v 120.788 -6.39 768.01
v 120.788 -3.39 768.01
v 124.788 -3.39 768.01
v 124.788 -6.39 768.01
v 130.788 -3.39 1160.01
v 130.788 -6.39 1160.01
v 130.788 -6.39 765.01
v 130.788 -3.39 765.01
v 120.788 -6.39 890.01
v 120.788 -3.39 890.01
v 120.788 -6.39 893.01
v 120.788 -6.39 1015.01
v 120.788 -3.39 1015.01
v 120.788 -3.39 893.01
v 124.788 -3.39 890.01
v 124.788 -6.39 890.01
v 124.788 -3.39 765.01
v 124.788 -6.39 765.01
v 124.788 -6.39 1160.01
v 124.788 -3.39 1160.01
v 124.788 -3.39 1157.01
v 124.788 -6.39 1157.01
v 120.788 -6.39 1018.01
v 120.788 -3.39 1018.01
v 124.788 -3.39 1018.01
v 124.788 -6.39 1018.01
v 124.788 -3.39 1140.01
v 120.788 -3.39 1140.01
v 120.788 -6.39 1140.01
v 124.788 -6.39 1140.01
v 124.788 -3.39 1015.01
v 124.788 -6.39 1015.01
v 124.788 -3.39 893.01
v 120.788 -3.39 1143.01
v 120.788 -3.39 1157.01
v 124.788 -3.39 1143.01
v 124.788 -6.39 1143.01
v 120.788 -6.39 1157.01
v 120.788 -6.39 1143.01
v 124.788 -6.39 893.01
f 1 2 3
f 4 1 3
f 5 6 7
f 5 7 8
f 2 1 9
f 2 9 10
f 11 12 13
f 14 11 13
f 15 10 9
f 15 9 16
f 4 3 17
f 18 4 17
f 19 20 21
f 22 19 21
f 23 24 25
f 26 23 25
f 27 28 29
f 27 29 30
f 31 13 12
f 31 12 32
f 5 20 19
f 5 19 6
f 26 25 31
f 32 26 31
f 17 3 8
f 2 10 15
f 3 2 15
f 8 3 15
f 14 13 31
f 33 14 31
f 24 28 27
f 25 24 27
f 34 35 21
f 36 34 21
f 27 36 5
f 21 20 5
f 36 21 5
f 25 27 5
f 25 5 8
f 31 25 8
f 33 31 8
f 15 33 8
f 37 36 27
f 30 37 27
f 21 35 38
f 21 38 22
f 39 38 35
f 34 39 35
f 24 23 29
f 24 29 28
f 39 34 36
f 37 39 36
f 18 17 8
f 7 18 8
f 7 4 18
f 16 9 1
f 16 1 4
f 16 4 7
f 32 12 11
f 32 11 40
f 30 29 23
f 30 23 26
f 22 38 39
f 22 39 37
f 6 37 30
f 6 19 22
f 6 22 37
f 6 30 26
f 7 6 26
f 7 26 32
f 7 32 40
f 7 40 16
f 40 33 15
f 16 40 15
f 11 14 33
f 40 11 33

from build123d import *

# Parameters (mm, degrees)
SKETCH_1_W          = 10
SKETCH_1_H          = 3
EXTRUDE_1_DEPTH     = 395
SKETCH_2_W          = 4
SKETCH_2_H          = 3
CUT_EXTRUDE_1_DEPTH = 1168.363523234


with BuildPart() as part:
    # 草图1 → 凸台-拉伸1 (new body)
    with BuildSketch(Plane.XY.offset(1160.01)):
        with Locations((125.787596038, -4.889694097)):
            Rectangle(SKETCH_1_W, SKETCH_1_H)
    extrude(amount=-EXTRUDE_1_DEPTH)

    # 草图2 → 切除-拉伸1 (cut, through all)
    with BuildSketch(Plane(origin=(0, -3.389694097, 0), x_dir=(1, 0, 0), z_dir=(0, 1, 0))):
        with Locations((122.787596038, -891.51)):
            Rectangle(SKETCH_2_W, SKETCH_2_H)
        with Locations((122.787596038, -766.51)):
            Rectangle(SKETCH_2_W, SKETCH_2_H)
        with Locations((122.787596038, -1016.51)):
            Rectangle(SKETCH_2_W, SKETCH_2_H)
        with Locations((122.787596038, -1141.51)):
            Rectangle(SKETCH_2_W, SKETCH_2_H)
        with Locations((122.787596038, -1158.51)):
            Rectangle(SKETCH_2_W, SKETCH_2_H)
    extrude(amount=-CUT_EXTRUDE_1_DEPTH, mode=Mode.SUBTRACT)


solid = part.part
